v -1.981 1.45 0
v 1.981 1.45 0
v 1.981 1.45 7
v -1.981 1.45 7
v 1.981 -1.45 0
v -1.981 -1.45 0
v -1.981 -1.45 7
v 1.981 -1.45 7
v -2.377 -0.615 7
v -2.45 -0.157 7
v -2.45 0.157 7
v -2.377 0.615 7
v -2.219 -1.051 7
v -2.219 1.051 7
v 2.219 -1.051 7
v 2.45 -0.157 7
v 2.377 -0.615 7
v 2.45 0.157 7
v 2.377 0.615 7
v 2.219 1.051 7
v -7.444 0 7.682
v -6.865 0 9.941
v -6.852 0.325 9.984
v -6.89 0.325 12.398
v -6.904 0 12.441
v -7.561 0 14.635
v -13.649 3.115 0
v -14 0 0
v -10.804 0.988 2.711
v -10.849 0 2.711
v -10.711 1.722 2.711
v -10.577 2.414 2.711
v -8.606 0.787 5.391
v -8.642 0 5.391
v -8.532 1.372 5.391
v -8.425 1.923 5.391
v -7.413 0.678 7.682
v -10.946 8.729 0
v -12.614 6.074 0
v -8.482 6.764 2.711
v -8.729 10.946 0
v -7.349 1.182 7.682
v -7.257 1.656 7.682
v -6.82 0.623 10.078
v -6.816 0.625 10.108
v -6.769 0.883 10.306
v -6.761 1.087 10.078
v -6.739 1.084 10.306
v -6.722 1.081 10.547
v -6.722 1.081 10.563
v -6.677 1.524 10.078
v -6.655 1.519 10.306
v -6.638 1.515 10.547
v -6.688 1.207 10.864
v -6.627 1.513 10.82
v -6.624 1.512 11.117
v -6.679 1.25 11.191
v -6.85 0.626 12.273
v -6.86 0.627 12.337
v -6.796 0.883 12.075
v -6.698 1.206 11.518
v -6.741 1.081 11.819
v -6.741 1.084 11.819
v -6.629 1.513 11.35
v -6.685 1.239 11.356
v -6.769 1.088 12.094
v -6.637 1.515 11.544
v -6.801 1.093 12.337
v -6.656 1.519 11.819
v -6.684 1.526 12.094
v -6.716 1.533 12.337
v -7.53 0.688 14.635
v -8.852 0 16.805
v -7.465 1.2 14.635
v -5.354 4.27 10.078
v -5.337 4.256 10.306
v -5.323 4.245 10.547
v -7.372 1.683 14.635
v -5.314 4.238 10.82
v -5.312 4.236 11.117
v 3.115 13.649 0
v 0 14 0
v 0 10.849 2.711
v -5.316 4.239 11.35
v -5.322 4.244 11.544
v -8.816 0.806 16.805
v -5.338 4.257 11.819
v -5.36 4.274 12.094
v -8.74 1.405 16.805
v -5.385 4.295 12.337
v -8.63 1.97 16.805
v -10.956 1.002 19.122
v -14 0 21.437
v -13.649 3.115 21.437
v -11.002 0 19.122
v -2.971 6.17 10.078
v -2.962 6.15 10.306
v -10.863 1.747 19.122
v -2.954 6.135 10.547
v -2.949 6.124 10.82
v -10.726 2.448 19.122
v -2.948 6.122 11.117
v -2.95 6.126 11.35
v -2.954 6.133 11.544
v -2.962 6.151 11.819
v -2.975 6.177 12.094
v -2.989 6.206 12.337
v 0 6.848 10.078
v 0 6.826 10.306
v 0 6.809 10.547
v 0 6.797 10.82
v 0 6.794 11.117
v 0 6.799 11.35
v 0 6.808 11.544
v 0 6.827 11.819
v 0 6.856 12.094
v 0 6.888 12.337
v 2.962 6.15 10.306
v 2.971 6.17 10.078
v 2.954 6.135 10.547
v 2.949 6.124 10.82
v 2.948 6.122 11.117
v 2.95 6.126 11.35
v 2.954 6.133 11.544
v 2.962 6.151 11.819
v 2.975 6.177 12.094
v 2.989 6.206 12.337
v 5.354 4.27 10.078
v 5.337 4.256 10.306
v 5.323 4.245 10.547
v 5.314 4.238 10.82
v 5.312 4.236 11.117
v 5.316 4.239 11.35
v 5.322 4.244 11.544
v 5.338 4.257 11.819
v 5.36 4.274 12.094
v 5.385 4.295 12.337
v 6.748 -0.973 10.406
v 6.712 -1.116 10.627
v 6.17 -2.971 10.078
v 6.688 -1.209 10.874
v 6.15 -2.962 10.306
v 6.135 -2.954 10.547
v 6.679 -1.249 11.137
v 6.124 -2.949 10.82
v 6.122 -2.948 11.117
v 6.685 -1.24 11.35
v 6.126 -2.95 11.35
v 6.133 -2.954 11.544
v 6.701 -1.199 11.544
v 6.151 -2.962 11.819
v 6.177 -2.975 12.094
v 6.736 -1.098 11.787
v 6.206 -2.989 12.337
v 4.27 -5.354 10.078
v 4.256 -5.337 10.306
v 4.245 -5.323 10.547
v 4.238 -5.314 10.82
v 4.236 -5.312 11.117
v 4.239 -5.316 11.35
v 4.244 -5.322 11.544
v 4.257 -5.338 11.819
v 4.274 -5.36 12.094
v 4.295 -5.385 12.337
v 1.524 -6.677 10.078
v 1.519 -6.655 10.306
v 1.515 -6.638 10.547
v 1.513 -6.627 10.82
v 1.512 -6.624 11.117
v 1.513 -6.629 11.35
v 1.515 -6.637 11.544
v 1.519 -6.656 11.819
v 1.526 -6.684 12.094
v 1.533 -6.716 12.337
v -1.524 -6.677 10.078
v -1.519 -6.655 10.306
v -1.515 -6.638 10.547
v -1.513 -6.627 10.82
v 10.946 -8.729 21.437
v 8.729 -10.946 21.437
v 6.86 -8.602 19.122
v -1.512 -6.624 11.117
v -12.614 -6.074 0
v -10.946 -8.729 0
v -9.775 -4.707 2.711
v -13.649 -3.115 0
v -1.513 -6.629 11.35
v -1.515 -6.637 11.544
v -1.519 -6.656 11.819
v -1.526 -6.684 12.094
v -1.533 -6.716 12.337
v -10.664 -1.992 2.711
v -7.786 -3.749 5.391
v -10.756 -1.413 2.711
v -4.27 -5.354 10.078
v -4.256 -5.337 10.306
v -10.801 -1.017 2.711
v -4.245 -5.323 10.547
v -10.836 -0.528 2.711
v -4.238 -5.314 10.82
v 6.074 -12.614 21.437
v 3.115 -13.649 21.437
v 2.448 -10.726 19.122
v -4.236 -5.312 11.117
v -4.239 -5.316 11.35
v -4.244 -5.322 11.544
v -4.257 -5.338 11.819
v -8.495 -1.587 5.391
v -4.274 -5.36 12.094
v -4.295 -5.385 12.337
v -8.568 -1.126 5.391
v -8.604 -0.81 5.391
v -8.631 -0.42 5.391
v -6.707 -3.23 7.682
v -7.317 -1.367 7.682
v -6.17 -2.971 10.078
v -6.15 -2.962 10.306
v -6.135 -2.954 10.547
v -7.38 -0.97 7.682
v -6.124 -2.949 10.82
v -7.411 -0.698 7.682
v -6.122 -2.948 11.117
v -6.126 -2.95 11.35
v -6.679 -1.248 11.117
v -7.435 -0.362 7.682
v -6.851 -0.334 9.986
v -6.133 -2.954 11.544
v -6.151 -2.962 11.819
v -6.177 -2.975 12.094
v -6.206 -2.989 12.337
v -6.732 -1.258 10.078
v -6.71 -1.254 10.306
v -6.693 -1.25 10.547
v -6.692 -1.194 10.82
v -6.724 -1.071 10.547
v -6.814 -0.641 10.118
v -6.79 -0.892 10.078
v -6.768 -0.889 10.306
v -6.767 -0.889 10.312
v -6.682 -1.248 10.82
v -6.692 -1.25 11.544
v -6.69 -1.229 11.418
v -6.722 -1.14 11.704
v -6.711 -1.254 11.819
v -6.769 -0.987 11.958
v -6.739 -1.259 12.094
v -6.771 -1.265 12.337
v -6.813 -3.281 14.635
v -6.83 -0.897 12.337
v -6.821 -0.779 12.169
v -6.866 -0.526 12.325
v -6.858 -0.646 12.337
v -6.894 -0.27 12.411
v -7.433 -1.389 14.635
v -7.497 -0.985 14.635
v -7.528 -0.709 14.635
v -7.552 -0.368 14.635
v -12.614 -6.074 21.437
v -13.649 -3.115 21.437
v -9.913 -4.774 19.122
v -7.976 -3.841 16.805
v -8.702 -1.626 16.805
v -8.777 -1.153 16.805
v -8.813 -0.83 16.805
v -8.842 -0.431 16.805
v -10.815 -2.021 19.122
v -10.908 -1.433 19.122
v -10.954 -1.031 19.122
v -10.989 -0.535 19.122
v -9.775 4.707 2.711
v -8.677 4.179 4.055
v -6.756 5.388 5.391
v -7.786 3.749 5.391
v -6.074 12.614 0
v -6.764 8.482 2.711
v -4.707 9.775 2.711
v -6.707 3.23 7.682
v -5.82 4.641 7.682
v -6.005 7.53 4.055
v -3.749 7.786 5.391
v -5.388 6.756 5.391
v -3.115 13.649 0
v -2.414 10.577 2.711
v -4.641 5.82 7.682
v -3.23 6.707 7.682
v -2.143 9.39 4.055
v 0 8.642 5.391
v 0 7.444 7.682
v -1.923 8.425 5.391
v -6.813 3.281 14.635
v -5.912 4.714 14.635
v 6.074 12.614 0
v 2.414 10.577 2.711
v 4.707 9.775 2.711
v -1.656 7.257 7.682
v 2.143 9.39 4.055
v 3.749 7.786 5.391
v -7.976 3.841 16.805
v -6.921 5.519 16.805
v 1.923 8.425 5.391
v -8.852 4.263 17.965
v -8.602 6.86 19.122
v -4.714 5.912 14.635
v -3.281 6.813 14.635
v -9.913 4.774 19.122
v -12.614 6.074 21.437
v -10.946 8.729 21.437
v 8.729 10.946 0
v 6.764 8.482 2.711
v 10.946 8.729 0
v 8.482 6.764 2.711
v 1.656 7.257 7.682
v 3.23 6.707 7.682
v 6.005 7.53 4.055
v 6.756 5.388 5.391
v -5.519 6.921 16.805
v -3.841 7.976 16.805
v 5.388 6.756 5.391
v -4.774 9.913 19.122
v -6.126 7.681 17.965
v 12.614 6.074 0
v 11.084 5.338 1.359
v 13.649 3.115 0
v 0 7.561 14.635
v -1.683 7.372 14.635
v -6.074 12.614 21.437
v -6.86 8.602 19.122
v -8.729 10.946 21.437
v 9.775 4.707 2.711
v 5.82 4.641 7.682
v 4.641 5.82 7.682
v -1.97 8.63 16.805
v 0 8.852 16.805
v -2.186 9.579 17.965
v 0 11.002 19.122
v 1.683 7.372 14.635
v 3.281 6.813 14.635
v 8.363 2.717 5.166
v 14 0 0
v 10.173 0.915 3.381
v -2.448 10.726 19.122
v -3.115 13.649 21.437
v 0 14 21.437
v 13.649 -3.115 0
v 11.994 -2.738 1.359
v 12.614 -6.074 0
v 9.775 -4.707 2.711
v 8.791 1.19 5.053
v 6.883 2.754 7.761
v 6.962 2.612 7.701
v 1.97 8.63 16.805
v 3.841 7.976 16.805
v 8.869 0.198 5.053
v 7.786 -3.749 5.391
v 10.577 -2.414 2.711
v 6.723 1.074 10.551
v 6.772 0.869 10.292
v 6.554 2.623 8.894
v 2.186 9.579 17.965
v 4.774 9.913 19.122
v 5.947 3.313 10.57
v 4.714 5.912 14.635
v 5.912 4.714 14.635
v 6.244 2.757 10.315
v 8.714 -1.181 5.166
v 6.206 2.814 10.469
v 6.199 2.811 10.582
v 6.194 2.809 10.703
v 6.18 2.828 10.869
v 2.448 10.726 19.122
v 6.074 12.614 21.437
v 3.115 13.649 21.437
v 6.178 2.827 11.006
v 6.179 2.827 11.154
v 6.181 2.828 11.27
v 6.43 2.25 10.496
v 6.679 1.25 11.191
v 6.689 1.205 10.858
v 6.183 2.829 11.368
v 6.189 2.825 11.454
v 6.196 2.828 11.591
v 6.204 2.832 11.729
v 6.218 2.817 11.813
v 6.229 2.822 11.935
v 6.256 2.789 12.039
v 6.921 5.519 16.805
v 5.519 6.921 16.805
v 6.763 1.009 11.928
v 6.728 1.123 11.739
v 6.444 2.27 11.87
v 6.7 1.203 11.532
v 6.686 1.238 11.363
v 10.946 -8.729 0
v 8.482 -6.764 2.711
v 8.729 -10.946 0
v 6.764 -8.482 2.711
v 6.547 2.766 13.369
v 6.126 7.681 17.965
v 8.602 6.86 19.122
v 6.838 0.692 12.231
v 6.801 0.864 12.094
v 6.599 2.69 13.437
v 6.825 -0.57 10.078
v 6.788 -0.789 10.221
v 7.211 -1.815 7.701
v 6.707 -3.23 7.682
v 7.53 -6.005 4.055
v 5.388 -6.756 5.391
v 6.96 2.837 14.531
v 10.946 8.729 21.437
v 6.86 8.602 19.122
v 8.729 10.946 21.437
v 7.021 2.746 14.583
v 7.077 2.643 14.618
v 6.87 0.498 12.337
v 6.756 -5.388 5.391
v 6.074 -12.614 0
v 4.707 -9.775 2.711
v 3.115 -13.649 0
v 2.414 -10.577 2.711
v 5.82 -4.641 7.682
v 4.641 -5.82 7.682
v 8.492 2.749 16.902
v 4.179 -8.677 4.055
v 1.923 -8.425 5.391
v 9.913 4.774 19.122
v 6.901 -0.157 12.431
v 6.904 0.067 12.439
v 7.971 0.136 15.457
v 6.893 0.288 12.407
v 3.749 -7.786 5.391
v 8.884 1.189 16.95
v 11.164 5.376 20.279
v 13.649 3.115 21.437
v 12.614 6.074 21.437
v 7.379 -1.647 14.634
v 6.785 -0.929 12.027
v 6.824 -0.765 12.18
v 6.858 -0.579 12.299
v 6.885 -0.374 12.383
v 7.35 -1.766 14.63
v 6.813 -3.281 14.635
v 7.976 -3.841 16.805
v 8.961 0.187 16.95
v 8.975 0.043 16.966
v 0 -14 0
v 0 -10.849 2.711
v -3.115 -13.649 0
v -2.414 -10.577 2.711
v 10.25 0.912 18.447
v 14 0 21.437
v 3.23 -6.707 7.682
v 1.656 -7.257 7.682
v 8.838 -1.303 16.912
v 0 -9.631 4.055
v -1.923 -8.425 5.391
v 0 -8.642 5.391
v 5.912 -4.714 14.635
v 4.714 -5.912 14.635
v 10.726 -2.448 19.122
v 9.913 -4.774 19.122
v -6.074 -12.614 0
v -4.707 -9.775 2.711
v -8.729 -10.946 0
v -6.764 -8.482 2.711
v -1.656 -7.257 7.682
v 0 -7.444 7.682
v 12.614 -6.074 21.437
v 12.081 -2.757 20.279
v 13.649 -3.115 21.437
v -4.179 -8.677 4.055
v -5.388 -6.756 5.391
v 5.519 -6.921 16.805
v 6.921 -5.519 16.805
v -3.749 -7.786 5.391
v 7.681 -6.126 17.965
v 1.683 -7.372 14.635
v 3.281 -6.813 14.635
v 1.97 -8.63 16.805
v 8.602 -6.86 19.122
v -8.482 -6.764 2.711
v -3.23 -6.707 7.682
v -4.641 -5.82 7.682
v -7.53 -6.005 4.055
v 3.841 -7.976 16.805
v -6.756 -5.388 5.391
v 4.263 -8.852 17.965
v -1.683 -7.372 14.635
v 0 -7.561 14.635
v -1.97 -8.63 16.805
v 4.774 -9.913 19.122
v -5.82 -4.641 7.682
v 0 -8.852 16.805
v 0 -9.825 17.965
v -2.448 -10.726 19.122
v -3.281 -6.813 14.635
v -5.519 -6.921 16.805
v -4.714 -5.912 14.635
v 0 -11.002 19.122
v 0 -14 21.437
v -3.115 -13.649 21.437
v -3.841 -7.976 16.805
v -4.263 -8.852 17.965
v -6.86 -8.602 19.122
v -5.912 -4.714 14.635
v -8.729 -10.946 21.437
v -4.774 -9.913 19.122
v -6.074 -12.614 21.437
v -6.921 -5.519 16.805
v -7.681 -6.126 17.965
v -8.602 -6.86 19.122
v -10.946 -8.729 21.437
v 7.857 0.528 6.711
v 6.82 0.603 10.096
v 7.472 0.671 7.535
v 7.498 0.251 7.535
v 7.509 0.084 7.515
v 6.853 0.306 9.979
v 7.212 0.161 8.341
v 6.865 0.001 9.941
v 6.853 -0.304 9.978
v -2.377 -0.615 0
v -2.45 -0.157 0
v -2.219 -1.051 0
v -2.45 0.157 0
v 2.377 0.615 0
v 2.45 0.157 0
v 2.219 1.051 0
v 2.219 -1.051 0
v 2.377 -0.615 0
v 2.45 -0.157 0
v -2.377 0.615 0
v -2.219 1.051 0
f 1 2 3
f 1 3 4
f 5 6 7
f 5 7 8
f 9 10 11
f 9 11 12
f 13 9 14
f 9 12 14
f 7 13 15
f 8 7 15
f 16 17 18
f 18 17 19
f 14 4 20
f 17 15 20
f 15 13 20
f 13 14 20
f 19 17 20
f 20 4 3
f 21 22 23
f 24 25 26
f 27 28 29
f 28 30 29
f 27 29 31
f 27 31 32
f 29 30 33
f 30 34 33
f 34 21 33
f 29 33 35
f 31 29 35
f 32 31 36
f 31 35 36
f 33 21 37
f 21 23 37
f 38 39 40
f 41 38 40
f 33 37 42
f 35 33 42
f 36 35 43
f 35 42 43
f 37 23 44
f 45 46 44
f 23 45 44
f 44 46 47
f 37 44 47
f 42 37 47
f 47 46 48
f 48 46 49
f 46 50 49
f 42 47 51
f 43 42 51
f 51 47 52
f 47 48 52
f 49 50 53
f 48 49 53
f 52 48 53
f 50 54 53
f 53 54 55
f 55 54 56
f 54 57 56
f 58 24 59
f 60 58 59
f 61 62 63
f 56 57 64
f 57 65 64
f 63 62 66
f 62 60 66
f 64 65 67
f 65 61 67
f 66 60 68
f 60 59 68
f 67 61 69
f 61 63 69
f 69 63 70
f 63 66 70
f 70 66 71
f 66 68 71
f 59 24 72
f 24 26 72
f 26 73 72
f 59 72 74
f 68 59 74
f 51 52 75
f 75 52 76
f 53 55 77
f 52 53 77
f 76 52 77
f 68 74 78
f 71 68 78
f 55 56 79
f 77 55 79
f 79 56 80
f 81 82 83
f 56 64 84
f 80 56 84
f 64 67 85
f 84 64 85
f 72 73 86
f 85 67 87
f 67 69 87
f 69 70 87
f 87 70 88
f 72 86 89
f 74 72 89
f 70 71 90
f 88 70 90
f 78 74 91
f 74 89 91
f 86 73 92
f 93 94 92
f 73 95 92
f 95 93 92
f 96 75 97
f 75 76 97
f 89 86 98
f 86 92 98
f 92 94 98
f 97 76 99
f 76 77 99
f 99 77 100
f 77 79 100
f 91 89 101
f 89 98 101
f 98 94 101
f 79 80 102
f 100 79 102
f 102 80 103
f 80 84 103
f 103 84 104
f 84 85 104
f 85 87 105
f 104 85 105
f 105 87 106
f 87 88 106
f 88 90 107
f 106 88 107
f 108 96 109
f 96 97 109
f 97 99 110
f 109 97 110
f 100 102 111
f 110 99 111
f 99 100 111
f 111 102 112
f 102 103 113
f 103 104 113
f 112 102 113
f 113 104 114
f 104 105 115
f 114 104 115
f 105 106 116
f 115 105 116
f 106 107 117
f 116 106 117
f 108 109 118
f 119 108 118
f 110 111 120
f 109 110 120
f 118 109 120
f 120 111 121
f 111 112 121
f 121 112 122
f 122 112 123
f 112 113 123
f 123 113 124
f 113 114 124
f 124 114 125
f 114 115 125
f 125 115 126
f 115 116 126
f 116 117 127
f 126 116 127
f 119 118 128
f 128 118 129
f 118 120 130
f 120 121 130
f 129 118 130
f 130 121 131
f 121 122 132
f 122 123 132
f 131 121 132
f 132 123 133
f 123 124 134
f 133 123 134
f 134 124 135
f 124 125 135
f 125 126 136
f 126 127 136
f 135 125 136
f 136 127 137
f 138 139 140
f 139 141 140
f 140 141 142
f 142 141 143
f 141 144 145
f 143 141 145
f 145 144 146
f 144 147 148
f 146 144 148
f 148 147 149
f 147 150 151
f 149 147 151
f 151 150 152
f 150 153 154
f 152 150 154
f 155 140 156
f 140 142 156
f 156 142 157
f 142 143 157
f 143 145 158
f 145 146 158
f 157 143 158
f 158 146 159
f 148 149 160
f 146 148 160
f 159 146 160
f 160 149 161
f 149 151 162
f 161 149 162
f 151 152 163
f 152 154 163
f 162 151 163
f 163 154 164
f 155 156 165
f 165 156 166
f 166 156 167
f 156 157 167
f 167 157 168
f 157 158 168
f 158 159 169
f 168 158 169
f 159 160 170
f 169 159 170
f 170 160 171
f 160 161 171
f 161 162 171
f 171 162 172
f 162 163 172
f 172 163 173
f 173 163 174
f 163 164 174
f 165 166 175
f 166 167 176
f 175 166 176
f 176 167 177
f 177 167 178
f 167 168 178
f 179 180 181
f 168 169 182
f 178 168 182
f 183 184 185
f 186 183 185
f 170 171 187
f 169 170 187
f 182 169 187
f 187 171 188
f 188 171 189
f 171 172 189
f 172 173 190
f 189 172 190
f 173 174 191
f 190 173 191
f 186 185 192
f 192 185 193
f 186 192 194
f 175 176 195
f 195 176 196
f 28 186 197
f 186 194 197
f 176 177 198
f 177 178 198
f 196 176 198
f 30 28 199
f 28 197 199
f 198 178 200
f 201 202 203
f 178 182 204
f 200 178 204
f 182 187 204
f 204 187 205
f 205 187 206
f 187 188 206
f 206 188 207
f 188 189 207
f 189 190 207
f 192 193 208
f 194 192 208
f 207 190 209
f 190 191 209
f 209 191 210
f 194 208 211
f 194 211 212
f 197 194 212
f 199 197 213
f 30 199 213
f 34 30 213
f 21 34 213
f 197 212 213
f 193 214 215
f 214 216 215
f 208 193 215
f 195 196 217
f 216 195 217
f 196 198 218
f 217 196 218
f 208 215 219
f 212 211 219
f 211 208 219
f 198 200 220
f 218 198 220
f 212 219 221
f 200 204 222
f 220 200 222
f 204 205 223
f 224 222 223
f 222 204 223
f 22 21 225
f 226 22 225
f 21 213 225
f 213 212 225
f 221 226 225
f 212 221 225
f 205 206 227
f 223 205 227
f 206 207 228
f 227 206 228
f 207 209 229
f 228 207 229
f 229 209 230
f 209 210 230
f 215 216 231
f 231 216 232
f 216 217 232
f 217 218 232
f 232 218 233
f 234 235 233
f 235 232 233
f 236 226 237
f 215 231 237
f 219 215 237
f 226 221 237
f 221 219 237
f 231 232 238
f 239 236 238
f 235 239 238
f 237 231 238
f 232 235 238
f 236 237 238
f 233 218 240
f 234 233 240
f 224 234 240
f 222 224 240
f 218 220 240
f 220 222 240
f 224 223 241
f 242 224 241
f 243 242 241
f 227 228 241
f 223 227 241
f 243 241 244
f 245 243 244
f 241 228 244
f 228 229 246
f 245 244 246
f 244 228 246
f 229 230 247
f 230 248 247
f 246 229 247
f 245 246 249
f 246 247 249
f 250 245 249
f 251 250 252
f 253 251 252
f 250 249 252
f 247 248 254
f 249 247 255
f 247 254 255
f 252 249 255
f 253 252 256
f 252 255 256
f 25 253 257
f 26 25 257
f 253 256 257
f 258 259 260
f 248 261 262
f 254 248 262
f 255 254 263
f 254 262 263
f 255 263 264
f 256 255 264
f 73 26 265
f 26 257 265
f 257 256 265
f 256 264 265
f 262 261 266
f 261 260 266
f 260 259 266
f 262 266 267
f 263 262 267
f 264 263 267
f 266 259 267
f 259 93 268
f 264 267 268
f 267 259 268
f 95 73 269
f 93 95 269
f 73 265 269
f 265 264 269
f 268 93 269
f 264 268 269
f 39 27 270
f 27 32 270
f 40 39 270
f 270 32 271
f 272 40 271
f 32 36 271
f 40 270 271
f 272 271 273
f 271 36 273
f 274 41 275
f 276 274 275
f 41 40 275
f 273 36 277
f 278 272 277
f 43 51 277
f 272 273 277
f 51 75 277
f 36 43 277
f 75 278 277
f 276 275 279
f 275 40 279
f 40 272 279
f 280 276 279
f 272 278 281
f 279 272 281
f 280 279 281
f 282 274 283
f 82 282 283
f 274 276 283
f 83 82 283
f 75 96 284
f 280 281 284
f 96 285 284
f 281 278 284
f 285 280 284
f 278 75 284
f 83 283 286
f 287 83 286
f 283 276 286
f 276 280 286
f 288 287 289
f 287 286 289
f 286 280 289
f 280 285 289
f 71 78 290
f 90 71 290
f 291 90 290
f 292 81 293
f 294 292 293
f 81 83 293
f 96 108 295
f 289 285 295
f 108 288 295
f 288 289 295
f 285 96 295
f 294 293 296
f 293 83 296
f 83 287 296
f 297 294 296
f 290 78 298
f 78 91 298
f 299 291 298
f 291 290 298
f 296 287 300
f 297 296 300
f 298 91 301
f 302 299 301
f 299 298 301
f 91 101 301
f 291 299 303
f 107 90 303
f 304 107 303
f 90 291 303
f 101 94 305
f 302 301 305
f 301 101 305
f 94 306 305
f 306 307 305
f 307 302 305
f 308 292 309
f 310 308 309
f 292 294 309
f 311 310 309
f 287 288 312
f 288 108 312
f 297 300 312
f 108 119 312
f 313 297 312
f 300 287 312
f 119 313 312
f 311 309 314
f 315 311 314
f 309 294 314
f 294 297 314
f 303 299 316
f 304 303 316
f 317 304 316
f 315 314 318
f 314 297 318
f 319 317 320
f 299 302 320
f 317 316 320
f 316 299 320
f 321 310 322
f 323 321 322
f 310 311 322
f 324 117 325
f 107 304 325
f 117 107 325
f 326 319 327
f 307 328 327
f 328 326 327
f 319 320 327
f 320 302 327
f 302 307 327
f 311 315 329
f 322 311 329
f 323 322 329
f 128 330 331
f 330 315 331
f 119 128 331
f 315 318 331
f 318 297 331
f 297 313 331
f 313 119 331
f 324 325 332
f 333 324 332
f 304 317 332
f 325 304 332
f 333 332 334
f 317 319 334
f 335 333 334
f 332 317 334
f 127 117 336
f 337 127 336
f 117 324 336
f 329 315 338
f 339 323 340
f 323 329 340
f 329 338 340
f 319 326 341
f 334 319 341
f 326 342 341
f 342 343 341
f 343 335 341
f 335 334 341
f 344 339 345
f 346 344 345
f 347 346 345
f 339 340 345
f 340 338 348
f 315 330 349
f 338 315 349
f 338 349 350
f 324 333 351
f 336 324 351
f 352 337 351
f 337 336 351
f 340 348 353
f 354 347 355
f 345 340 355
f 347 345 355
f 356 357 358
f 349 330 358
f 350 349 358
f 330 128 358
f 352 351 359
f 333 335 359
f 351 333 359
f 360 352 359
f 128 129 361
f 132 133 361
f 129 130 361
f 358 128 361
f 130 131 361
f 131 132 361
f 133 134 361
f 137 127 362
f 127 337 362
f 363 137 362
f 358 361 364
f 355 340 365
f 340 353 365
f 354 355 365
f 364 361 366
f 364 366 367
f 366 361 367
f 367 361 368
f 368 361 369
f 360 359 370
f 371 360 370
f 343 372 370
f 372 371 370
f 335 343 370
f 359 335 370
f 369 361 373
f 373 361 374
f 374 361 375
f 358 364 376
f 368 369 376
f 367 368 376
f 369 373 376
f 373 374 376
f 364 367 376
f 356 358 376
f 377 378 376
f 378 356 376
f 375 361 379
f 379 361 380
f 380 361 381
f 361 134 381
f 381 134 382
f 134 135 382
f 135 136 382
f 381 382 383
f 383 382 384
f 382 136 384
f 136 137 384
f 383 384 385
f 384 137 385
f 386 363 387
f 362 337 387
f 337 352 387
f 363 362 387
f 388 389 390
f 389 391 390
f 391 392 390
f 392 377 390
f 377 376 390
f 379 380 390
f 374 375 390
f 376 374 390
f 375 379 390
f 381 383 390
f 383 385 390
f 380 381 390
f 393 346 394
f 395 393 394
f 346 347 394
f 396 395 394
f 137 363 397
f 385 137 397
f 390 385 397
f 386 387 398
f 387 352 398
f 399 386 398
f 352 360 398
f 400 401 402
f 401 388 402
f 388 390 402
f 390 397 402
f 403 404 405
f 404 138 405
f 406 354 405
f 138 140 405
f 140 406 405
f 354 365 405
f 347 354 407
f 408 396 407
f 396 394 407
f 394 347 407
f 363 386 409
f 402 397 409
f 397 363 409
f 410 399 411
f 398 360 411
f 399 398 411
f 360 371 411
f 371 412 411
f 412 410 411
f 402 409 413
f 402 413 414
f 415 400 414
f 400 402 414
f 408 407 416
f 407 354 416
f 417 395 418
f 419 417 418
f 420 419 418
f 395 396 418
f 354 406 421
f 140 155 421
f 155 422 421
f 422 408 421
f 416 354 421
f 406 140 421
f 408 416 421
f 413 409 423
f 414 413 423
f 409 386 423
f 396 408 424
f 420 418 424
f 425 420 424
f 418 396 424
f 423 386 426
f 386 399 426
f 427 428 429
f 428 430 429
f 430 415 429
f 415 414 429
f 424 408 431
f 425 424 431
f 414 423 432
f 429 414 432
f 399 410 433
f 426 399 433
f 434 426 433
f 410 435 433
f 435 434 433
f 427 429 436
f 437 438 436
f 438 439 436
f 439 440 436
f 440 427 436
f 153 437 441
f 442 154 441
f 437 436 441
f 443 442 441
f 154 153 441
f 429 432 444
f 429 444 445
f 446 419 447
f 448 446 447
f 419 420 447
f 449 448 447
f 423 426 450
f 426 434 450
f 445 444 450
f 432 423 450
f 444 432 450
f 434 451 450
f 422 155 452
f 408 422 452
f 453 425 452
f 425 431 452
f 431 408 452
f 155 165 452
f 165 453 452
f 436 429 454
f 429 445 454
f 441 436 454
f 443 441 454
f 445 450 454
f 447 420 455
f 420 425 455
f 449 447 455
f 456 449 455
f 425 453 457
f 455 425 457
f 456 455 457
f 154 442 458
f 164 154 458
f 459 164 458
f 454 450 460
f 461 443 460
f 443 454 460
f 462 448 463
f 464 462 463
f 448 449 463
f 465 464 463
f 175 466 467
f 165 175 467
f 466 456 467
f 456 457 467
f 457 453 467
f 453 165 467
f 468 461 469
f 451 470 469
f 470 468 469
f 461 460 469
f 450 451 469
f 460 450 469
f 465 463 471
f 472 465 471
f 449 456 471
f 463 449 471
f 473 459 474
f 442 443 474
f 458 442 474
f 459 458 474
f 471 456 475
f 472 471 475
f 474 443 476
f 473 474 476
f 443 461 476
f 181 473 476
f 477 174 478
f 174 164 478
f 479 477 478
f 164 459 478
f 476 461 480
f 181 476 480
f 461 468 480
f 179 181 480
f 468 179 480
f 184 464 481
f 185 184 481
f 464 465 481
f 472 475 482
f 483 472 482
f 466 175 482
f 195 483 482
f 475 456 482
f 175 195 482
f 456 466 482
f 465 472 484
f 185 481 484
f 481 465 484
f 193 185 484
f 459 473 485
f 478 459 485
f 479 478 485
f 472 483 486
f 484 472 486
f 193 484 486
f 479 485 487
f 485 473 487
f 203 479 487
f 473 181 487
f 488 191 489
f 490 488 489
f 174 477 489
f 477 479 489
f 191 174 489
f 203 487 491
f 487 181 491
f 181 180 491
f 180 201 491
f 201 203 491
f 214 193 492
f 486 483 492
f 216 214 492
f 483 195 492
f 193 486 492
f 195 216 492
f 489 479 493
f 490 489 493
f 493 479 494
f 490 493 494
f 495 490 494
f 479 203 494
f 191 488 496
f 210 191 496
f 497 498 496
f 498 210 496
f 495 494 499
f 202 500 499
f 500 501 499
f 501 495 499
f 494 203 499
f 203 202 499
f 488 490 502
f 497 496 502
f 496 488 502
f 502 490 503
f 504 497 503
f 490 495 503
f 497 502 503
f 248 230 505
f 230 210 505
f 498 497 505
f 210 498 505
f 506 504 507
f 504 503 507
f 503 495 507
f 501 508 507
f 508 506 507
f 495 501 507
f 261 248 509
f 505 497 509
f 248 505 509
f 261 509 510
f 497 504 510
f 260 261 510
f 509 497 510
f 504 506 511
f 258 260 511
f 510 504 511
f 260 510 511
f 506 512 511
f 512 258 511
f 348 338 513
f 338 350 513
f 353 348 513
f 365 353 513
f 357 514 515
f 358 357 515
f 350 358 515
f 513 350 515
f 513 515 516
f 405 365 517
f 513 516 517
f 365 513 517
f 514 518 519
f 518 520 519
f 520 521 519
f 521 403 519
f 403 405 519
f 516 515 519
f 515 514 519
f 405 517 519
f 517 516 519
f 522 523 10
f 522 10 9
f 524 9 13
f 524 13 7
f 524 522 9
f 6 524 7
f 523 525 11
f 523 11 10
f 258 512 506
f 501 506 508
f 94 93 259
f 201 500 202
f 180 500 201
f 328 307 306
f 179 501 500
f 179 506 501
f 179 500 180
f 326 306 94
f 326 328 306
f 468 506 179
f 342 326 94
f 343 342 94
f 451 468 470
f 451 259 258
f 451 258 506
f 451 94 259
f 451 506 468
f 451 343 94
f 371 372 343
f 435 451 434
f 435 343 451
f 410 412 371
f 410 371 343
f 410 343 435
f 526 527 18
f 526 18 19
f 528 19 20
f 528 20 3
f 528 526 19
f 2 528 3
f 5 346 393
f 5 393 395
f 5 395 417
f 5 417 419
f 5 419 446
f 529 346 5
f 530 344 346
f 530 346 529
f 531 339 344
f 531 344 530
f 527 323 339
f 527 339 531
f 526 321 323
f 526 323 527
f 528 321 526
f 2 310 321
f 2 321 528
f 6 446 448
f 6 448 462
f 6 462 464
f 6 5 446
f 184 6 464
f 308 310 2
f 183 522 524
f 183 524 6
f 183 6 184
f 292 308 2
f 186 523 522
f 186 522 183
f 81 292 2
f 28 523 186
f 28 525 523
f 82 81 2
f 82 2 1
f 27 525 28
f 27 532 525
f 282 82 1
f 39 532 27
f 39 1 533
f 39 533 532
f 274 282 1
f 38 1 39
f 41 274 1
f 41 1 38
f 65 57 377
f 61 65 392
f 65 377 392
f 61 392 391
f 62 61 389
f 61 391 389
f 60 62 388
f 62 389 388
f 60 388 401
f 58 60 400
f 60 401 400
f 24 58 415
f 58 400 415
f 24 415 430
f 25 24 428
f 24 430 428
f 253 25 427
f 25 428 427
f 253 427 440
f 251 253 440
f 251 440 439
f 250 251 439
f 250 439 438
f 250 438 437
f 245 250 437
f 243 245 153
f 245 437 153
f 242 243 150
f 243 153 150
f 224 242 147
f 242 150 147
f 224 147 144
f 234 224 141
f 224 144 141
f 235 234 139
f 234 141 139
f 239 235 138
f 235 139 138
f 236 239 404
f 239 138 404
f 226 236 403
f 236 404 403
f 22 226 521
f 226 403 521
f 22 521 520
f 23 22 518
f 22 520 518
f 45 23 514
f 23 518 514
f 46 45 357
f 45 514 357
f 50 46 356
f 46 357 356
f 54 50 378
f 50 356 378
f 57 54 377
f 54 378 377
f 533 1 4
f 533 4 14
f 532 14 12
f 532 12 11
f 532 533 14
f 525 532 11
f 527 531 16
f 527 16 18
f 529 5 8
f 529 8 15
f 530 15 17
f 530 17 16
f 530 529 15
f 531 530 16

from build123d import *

# Parameters (mm, degrees)
F1_DEPTH = 7
F5_R     = 1.25
F6_DEPTH = 12.7
F7_DEPTH = 12.7


with BuildPart() as f1:
    # F0 (on Top) → F1 (new body)
    with BuildSketch(Plane.XY):
        with BuildLine():
            Line((2.45, -0.1566045976), (2.45, 0.1566045976))
            ThreePointArc((2.45, 0.1566045976), (2.3079752756, 0.8368244303), (1.9810413928, 1.45))
            Line((1.9810413928, 1.45), (-1.9810413928, 1.45))
            ThreePointArc((-1.9810413928, 1.45), (-2.3079752756, 0.8368244303), (-2.45, 0.1566045976))
            Line((-2.45, 0.1566045976), (-2.45, -0.1566045976))
            ThreePointArc((-2.45, -0.1566045976), (-2.3079752756, -0.8368244303), (-1.9810413928, -1.45))
            Line((-1.9810413928, -1.45), (1.9810413928, -1.45))
            ThreePointArc((1.9810413928, -1.45), (2.3079752756, -0.8368244303), (2.45, -0.1566045976))
        make_face()
    extrude(amount=F1_DEPTH)


with BuildPart() as f3:
    # F2 (on Front) → F3 (revolve)
    with BuildSketch(Plane.XZ):
        with BuildLine():
            Line((-14, 0), (0, 0))
            Line((0, 0), (0, 21.4365181362))
            Line((0, 21.4365181362), (-14, 21.4365181362))
            add(Edge.make_bspline(
                [(-14, 0), (-8.8714333251, 3.8340229075), (-4.6648319414, 11.2416137663), (-8.975234814, 18.0547777563), (-14, 21.4365181362)],
                knots=[0, 0, 0, 0, 0.5078007038, 1, 1, 1, 1], degree=3))
        make_face()
    revolve(axis=Axis((0, 0, 10.7182590681), (0, 0, -1)))

    # F4: cut F1
    add(f1.part, mode=Mode.SUBTRACT)

    # F5 (on Right) → F6 (cut)
    with BuildSketch(Plane.YZ):
        with Locations((0, 11.1907251761)):
            Circle(F5_R)
    extrude(amount=-F6_DEPTH, mode=Mode.SUBTRACT)

    # F5 (on Right) → F7 (cut)
    with BuildSketch(Plane.YZ):
        with Locations((0, 11.1907251761)):
            Circle(F5_R)
    extrude(amount=F7_DEPTH, mode=Mode.SUBTRACT)


solid = f3.part
